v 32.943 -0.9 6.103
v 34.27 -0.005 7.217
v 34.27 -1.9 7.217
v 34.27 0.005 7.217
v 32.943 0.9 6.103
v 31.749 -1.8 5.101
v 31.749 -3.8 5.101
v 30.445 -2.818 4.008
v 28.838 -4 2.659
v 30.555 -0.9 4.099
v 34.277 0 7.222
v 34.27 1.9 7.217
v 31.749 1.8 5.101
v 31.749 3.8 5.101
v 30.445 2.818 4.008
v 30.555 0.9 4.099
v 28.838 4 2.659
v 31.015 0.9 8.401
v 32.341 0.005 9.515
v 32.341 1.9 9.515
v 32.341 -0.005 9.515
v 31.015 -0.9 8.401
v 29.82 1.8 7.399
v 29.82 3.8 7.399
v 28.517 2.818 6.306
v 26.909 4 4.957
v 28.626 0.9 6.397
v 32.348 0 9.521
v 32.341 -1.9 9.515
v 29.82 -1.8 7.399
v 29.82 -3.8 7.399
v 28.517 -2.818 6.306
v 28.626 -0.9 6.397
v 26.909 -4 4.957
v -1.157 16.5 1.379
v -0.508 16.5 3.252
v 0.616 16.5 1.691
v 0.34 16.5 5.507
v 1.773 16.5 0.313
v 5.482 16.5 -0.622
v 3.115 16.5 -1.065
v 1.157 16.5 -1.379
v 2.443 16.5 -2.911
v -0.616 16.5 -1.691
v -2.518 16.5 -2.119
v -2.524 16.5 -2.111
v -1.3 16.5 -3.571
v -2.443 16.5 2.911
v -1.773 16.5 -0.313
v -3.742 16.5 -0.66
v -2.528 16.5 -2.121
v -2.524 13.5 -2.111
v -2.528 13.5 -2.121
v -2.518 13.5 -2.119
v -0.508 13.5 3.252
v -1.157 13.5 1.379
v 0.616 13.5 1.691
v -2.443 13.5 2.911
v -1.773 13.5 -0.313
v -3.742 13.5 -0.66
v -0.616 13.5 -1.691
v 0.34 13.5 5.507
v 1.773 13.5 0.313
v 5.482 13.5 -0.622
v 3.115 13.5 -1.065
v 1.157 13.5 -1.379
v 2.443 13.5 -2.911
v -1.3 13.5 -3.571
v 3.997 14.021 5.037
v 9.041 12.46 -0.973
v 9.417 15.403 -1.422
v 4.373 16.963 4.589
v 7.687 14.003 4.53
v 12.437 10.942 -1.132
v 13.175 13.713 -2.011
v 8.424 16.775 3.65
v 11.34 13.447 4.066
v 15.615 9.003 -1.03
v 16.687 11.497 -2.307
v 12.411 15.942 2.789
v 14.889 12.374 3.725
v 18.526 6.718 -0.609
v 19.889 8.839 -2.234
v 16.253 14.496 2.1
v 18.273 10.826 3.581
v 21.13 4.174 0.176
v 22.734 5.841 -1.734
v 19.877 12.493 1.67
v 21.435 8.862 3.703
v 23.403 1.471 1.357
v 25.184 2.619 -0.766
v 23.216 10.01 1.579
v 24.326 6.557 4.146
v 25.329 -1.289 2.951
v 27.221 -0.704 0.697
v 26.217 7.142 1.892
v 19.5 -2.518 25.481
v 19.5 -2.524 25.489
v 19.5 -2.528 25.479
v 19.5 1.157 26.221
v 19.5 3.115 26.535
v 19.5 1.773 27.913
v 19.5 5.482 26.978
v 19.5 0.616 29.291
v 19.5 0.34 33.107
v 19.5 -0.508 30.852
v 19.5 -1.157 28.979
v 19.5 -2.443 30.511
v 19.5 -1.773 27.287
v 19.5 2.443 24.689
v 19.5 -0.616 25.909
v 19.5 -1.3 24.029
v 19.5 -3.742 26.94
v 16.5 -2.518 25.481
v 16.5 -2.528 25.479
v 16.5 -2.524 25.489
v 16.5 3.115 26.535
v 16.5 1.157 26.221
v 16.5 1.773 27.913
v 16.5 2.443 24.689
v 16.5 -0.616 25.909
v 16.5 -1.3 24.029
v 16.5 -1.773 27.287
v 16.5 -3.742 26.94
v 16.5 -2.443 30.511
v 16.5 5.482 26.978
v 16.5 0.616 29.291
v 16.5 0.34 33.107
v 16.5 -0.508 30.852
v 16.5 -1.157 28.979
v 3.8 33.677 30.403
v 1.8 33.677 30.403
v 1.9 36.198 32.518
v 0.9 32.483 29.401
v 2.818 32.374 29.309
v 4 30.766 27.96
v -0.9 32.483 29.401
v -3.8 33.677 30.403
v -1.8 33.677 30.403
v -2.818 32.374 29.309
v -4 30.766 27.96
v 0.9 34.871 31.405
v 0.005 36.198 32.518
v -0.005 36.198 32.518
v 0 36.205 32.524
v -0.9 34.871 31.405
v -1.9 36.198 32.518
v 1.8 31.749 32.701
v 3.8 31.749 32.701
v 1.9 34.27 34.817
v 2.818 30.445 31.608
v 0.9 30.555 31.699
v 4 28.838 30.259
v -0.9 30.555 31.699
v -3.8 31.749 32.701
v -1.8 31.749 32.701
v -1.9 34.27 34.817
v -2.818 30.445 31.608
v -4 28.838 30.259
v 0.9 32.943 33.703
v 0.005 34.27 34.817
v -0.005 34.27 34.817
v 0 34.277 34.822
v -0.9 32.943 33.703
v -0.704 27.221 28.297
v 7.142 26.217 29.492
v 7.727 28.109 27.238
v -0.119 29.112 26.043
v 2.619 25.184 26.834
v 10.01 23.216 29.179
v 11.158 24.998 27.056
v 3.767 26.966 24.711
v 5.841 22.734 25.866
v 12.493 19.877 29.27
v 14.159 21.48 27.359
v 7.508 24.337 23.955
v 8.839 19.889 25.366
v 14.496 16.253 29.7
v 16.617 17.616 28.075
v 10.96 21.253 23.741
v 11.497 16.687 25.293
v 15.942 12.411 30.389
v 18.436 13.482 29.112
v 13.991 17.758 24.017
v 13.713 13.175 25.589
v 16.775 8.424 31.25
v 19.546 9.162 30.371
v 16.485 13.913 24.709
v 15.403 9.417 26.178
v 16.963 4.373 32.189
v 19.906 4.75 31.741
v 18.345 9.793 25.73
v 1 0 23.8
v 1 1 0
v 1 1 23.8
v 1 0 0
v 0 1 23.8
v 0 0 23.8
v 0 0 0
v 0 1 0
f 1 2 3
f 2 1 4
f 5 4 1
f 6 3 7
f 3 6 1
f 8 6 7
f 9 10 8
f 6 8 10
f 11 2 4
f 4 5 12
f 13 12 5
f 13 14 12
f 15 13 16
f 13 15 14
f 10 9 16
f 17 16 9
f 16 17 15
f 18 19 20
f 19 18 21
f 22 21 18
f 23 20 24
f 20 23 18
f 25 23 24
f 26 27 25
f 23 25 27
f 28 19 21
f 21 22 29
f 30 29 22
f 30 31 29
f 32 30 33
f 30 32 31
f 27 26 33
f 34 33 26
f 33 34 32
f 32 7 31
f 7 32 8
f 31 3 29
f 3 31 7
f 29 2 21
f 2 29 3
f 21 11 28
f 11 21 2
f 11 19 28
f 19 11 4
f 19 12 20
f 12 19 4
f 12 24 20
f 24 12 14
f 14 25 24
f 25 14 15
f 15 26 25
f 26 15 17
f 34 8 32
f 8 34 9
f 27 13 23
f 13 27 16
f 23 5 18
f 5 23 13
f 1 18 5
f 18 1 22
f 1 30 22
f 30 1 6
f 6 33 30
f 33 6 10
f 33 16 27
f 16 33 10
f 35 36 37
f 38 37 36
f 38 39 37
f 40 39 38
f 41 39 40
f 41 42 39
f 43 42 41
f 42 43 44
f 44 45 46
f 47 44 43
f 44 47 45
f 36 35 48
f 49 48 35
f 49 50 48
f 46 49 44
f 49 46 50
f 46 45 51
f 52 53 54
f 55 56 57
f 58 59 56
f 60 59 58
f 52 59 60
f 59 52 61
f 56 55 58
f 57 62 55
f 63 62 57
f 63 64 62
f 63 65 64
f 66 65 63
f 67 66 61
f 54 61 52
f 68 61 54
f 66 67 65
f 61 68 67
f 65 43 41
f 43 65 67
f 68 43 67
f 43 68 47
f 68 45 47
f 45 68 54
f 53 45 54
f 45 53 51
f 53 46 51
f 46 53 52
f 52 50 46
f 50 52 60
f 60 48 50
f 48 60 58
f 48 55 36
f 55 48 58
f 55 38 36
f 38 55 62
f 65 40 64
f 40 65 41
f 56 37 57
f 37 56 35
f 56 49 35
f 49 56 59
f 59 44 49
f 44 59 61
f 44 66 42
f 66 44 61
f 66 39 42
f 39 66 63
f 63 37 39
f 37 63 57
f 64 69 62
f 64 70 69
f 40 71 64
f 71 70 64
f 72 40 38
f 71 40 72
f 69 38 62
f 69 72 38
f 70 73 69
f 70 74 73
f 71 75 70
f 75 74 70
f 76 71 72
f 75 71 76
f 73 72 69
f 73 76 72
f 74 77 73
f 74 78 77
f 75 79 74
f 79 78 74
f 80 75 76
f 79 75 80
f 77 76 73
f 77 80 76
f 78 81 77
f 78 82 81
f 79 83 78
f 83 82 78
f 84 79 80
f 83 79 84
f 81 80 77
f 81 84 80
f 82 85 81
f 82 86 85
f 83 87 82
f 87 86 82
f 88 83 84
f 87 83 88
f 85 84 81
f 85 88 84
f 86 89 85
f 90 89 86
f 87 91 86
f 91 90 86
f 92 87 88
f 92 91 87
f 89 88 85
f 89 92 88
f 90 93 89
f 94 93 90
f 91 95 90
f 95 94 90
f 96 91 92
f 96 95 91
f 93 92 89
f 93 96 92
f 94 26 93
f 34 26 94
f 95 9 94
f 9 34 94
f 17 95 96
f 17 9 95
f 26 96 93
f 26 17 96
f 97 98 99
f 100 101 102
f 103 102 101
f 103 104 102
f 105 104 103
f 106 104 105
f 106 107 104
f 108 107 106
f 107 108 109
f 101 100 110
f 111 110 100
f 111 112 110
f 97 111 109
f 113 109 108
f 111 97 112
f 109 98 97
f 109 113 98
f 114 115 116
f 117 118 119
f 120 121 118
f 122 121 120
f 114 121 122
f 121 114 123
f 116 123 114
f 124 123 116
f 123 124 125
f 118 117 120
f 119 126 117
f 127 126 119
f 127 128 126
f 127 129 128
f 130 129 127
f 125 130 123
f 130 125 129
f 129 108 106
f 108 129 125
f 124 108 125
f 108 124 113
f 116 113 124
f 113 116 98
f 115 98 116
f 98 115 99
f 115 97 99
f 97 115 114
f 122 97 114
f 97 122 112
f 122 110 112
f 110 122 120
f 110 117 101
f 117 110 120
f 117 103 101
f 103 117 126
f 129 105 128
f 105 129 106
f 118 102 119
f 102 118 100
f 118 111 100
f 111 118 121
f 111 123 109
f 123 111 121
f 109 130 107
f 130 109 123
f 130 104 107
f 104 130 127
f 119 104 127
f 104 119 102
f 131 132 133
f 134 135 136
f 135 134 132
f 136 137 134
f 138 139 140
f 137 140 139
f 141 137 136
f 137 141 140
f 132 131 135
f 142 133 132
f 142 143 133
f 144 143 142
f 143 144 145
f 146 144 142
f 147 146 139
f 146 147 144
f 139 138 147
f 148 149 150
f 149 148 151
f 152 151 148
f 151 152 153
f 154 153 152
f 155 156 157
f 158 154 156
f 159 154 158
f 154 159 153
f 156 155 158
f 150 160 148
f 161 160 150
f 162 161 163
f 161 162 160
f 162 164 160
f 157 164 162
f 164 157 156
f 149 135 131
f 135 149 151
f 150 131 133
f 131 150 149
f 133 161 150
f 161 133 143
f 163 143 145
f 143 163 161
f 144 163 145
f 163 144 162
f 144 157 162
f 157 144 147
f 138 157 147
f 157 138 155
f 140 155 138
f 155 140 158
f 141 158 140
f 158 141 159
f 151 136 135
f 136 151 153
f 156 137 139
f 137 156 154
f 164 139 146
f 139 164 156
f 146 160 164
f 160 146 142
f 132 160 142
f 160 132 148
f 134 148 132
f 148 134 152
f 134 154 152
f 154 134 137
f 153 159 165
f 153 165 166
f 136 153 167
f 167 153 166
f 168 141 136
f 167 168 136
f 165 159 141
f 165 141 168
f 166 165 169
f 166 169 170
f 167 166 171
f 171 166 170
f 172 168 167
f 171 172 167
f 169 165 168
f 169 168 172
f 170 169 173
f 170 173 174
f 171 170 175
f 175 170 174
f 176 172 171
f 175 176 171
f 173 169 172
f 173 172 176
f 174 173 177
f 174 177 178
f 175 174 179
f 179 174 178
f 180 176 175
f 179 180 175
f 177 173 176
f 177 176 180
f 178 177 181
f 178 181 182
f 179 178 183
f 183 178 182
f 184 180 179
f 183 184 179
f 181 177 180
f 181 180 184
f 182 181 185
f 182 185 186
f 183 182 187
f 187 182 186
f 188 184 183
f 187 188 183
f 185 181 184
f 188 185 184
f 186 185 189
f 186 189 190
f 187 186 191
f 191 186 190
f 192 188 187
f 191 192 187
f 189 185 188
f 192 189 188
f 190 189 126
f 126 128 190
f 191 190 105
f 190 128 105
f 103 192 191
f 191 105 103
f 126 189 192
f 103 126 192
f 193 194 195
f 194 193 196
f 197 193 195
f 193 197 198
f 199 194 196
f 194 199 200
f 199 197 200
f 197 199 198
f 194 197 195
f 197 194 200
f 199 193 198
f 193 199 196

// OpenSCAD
/* basic idea */
module v1(n_twist=8, n_arms_mult=2, h=10, r=10, square_xy=[4,1]) {
  for (level=[0,1]) {
    for (ang=[0:360/n_twist:360]) {
      for (m=[1,1/n_arms_mult,2-1/n_arms_mult]) {
        for (ms=[-1,1]) {
          /* for (ith_arm=[0:1:n_arms]) { */
          translate([0,0,level*h])
            linear_extrude(
                height=h, center=false,
                twist=(360/n_twist )*(level % 2 == 0 ? 1 : -1))
            translate([r*sin(ang*m*ms), r*cos(ang*m*ms), 0])
            rotate([0,0,(360/n_twist*-1)*(level%2)])
            square(square_xy, center=true);
        }
        }
      }
    }
  }

  /* improved: num arms is cleaner. rotation correct */
  module v2(twist_deg, n_arms, n_segments, h_segment, r, square_xy=[1,1], t) {
    h_tip = 7.6;

    for (level=[0:1:n_segments-1])
      for (ang=[0:360/n_arms:360]) {
        si = ((level%2) == 0) ? 1 : -1;
        incr = (level%2)*twist_deg;
        incr2 = (level%2==0?1:0)*twist_deg;
        translate([0,0,level*h_segment+1*level]) {
          linear_extrude(
              height=h_segment - h_tip, center=false,
              twist=twist_deg*si)
            translate([r*sin(ang+incr), r*cos(ang+incr), 0])
            rotate([0,0,360-(ang+incr)])
            square(square_xy, center=true);

          translate([r*sin(ang+incr), r*cos(ang+incr), 0])
            rotate([180,0,360-(ang+incr)])
            tip(square_xy[0], square_xy[1], 3.6/2, h_tip/2, $fn=6);

#translate([r*sin(ang + incr2), r*cos(ang + incr2), h_segment-h_tip])
          rotate([0,0,360-(ang+incr2)])
            tip(square_xy[0], square_xy[1], 3.6/2, h_tip/2, $fn=6);
        }
      }
  }

  module tip(x, y, r_bolt, r_o) {
    translate([0,3/2,0])
      rotate([90,0,0])
      linear_extrude(height=y)
      difference(){
        union(){
          translate([0,r_o,0])circle(r=r_o, center=true);
          polygon([
              [-x/2,0],
              [0,2*r_o-.5],
              [x/2,0]]);
          /* polygon([ */
          /* [-x/2,-y/2], [-x/2,y/2], */
          /* [0,2*r_o], */
          /* [x/2,y/2], [x/2,-y/2]]); */
        }
        translate([0,r_o,0])circle(r=r_bolt);
      }
    /* } */
}

module lego_part(lx, ly, lz, l_ro, l_rbolt, a_r, a_deg) {
  translate([a_r*sin(a_deg),a_r*cos(a_deg),lz])
    rotate([0,0,-a_deg])
    tip(lx, ly, l_rbolt, l_ro, $fn=6);
  translate([a_r*sin(0),a_r*cos(0),0])
    mirror([0,0,1])tip(lx, ly, l_rbolt, l_ro, $fn=6);
  linear_extrude(height=lz, twist=a_deg)
    translate([a_r*sin(0), a_r*cos(0),0])square([lx, ly], center=true);
}
module v2_trellis() {
  // lego part dimensions
  lx = 8;
  ly = 3;
  lz = 20;
  l_ro = 7.6/2;
  l_rbolt = 3.6/2;
  // arm dimensions
  a_r = 15;
  a_deg = 90;

  module lego_1() {
    translate([0,0,l_ro])
      lego_part(lx, ly, lz, l_ro, l_rbolt, a_r, a_deg);
  }
  module lego_2() {
    translate([0,0,l_ro])
      lego_part(lx, ly, lz, l_ro, l_rbolt, a_r+ly, a_deg);
  }

  module segment(angle) {
    rotate(a=angle, v=[sin(0),cos(0),0])
      lego_1();
    /* rotate([0,90,0])lego_1(); */

    /* mirror([0,1,0])lego_2(); */
    translate([0,0,(lz+2*l_ro)]) {
      /* hull(){cube([1,1,1],center=true);translate([30*sin(a_deg), 30*cos(a_deg),0])cube([1,1,1],center=true);} */
      rotate(a=-angle, v=[sin(a_deg),cos(a_deg),0])
        translate([0,0,(lz+2*l_ro)])
          mirror([0,0,1])
            lego_2();
      }
  }
  segment(50);
  rotate([0,0,0])cube([1,1,lz+l_ro],center=false);
  /* translate([0,0,2*(lz+2*l_ro)])segment(); */
  /* { */
  /* lego_2(); */
  /* mirror([1,0,0])lego_1(); */
  /* } */
}
v2_trellis();


/* lego_part(lx, ly, lz, l_ro, l_rbolt, a_r, a_deg); */


/* v1(); */
/* v2( */
/* twist_deg=360/8, */
/* n_arms=10, */
/* h=10, */
/* r=10, */
/* square_xy=[4,1]); */

/* v2( */
/* twist_deg=45, */
/* n_arms=2, */
/* n_segments=6, */
/* h_segment=20, */
/* r=10, */
/* square_xy=[8,3], t=$t/100); */
